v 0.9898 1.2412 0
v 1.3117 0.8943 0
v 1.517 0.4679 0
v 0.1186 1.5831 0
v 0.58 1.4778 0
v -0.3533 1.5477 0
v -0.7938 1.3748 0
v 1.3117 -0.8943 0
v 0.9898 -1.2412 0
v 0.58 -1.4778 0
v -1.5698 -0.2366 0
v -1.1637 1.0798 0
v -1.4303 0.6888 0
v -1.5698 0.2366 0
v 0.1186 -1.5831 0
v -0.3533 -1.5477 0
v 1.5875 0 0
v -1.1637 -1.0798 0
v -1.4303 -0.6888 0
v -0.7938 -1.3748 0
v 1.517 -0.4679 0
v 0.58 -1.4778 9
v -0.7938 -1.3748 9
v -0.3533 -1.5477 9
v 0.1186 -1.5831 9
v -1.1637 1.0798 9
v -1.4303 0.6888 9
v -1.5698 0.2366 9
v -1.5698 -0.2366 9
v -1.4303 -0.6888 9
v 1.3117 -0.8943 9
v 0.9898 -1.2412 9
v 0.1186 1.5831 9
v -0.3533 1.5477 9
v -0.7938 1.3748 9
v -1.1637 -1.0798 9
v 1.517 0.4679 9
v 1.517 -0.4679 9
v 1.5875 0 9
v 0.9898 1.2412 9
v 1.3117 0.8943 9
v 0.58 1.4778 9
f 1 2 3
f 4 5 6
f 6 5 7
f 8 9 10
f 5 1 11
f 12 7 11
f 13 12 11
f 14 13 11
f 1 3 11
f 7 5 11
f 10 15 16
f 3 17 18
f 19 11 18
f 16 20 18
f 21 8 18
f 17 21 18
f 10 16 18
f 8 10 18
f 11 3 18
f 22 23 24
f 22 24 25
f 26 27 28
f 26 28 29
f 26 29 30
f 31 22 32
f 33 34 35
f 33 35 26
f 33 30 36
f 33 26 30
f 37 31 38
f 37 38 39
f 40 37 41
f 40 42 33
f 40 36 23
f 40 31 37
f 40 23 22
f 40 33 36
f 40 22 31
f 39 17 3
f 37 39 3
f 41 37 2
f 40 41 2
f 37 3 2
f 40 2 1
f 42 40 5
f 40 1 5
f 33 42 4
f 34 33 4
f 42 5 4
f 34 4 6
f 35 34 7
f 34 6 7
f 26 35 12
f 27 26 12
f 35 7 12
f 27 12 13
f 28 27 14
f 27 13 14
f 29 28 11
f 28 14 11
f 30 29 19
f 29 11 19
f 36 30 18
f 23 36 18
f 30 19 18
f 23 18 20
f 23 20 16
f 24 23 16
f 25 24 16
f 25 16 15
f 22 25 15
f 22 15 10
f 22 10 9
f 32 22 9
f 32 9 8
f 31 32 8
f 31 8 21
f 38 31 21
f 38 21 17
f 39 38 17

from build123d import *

# Parameters (mm, degrees)
F2_DEPTH = 5
F3_R     = 1.5875
F4_DEPTH = 9
F5_DEPTH = 25


with BuildPart() as f2:
    # F1 (on Front) → F2 (new body, symmetric)
    with BuildSketch(Plane.XZ):
        Polygon((1.5875, -8), (1.5875, 0), (-1.5875, 0), (-1.5875, -8), (-8.25, -8), (-8.25, -19.5), (8.25, -19.5), (8.25, -8), align=None)
    extrude(amount=F2_DEPTH, both=True)

    # F3 (on Top) → F4 (join)
    with BuildSketch(Plane.XY):
        Circle(F3_R)
    extrude(amount=F4_DEPTH)

    # F5 (cut): a face of the model
    f5_faces = [f2.faces().sort_by_distance(p)[0] for p in [
        (0, -5, -12.5989425982),
    ]]
    extrude(f5_faces, amount=-F5_DEPTH, mode=Mode.SUBTRACT)


solid = f2.part
